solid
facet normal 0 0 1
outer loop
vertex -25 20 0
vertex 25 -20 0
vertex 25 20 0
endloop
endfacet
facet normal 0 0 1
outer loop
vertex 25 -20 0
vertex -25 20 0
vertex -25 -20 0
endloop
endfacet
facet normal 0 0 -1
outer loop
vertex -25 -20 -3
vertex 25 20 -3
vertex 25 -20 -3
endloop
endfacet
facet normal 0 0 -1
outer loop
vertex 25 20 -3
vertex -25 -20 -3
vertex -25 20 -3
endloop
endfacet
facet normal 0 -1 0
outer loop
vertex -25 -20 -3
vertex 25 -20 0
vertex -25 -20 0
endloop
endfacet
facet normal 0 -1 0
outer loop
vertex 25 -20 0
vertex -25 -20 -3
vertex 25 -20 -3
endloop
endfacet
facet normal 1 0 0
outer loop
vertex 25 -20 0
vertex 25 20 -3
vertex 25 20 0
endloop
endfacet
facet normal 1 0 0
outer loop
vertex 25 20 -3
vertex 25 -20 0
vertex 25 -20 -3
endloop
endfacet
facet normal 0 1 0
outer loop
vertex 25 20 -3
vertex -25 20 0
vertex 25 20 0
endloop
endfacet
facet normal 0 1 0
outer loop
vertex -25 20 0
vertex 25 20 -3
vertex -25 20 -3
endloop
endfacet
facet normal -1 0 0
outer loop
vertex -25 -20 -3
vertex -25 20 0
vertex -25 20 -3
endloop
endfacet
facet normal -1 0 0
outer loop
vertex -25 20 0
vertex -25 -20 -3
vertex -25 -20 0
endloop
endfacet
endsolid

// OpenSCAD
// file: config.scad
// all measures in mm

material_x = 510;
material_y = 370;
material_width = 3;

leg_x = 50;
leg_y = 40;
leg_z = 120;

// about hoch much the faces in Y direction are inset
face_y_inset = 5;

// how far the joint extends planarly from the face
joint_x = 5;
// the lateral width of the joint
joint_y = 10;
// how far down the hook extends
joint_hook_y = 5;

joint_total_height = joint_y + joint_hook_y;

num_joints = 3;
q = leg_z/4;
joint_height = [q, 2*q, 3*q];

// how far apart from on another to project the parts
projection_spacing = 1;

// rendering quality (face number)
$fn = 50;
// main file
include <config.scad>;

/**
 * Basically just a rectangle with holes
 * X: center
 * Y: center
 * Z: top @ 0, bottom @ -material_width
 */
module face_z()
{
    color("yellow")
    translate([
        -leg_x/2,
        -leg_y/2,
        -material_width])
    cube([
        leg_x,
        leg_y,
        material_width
        ]);
}

face_z();
